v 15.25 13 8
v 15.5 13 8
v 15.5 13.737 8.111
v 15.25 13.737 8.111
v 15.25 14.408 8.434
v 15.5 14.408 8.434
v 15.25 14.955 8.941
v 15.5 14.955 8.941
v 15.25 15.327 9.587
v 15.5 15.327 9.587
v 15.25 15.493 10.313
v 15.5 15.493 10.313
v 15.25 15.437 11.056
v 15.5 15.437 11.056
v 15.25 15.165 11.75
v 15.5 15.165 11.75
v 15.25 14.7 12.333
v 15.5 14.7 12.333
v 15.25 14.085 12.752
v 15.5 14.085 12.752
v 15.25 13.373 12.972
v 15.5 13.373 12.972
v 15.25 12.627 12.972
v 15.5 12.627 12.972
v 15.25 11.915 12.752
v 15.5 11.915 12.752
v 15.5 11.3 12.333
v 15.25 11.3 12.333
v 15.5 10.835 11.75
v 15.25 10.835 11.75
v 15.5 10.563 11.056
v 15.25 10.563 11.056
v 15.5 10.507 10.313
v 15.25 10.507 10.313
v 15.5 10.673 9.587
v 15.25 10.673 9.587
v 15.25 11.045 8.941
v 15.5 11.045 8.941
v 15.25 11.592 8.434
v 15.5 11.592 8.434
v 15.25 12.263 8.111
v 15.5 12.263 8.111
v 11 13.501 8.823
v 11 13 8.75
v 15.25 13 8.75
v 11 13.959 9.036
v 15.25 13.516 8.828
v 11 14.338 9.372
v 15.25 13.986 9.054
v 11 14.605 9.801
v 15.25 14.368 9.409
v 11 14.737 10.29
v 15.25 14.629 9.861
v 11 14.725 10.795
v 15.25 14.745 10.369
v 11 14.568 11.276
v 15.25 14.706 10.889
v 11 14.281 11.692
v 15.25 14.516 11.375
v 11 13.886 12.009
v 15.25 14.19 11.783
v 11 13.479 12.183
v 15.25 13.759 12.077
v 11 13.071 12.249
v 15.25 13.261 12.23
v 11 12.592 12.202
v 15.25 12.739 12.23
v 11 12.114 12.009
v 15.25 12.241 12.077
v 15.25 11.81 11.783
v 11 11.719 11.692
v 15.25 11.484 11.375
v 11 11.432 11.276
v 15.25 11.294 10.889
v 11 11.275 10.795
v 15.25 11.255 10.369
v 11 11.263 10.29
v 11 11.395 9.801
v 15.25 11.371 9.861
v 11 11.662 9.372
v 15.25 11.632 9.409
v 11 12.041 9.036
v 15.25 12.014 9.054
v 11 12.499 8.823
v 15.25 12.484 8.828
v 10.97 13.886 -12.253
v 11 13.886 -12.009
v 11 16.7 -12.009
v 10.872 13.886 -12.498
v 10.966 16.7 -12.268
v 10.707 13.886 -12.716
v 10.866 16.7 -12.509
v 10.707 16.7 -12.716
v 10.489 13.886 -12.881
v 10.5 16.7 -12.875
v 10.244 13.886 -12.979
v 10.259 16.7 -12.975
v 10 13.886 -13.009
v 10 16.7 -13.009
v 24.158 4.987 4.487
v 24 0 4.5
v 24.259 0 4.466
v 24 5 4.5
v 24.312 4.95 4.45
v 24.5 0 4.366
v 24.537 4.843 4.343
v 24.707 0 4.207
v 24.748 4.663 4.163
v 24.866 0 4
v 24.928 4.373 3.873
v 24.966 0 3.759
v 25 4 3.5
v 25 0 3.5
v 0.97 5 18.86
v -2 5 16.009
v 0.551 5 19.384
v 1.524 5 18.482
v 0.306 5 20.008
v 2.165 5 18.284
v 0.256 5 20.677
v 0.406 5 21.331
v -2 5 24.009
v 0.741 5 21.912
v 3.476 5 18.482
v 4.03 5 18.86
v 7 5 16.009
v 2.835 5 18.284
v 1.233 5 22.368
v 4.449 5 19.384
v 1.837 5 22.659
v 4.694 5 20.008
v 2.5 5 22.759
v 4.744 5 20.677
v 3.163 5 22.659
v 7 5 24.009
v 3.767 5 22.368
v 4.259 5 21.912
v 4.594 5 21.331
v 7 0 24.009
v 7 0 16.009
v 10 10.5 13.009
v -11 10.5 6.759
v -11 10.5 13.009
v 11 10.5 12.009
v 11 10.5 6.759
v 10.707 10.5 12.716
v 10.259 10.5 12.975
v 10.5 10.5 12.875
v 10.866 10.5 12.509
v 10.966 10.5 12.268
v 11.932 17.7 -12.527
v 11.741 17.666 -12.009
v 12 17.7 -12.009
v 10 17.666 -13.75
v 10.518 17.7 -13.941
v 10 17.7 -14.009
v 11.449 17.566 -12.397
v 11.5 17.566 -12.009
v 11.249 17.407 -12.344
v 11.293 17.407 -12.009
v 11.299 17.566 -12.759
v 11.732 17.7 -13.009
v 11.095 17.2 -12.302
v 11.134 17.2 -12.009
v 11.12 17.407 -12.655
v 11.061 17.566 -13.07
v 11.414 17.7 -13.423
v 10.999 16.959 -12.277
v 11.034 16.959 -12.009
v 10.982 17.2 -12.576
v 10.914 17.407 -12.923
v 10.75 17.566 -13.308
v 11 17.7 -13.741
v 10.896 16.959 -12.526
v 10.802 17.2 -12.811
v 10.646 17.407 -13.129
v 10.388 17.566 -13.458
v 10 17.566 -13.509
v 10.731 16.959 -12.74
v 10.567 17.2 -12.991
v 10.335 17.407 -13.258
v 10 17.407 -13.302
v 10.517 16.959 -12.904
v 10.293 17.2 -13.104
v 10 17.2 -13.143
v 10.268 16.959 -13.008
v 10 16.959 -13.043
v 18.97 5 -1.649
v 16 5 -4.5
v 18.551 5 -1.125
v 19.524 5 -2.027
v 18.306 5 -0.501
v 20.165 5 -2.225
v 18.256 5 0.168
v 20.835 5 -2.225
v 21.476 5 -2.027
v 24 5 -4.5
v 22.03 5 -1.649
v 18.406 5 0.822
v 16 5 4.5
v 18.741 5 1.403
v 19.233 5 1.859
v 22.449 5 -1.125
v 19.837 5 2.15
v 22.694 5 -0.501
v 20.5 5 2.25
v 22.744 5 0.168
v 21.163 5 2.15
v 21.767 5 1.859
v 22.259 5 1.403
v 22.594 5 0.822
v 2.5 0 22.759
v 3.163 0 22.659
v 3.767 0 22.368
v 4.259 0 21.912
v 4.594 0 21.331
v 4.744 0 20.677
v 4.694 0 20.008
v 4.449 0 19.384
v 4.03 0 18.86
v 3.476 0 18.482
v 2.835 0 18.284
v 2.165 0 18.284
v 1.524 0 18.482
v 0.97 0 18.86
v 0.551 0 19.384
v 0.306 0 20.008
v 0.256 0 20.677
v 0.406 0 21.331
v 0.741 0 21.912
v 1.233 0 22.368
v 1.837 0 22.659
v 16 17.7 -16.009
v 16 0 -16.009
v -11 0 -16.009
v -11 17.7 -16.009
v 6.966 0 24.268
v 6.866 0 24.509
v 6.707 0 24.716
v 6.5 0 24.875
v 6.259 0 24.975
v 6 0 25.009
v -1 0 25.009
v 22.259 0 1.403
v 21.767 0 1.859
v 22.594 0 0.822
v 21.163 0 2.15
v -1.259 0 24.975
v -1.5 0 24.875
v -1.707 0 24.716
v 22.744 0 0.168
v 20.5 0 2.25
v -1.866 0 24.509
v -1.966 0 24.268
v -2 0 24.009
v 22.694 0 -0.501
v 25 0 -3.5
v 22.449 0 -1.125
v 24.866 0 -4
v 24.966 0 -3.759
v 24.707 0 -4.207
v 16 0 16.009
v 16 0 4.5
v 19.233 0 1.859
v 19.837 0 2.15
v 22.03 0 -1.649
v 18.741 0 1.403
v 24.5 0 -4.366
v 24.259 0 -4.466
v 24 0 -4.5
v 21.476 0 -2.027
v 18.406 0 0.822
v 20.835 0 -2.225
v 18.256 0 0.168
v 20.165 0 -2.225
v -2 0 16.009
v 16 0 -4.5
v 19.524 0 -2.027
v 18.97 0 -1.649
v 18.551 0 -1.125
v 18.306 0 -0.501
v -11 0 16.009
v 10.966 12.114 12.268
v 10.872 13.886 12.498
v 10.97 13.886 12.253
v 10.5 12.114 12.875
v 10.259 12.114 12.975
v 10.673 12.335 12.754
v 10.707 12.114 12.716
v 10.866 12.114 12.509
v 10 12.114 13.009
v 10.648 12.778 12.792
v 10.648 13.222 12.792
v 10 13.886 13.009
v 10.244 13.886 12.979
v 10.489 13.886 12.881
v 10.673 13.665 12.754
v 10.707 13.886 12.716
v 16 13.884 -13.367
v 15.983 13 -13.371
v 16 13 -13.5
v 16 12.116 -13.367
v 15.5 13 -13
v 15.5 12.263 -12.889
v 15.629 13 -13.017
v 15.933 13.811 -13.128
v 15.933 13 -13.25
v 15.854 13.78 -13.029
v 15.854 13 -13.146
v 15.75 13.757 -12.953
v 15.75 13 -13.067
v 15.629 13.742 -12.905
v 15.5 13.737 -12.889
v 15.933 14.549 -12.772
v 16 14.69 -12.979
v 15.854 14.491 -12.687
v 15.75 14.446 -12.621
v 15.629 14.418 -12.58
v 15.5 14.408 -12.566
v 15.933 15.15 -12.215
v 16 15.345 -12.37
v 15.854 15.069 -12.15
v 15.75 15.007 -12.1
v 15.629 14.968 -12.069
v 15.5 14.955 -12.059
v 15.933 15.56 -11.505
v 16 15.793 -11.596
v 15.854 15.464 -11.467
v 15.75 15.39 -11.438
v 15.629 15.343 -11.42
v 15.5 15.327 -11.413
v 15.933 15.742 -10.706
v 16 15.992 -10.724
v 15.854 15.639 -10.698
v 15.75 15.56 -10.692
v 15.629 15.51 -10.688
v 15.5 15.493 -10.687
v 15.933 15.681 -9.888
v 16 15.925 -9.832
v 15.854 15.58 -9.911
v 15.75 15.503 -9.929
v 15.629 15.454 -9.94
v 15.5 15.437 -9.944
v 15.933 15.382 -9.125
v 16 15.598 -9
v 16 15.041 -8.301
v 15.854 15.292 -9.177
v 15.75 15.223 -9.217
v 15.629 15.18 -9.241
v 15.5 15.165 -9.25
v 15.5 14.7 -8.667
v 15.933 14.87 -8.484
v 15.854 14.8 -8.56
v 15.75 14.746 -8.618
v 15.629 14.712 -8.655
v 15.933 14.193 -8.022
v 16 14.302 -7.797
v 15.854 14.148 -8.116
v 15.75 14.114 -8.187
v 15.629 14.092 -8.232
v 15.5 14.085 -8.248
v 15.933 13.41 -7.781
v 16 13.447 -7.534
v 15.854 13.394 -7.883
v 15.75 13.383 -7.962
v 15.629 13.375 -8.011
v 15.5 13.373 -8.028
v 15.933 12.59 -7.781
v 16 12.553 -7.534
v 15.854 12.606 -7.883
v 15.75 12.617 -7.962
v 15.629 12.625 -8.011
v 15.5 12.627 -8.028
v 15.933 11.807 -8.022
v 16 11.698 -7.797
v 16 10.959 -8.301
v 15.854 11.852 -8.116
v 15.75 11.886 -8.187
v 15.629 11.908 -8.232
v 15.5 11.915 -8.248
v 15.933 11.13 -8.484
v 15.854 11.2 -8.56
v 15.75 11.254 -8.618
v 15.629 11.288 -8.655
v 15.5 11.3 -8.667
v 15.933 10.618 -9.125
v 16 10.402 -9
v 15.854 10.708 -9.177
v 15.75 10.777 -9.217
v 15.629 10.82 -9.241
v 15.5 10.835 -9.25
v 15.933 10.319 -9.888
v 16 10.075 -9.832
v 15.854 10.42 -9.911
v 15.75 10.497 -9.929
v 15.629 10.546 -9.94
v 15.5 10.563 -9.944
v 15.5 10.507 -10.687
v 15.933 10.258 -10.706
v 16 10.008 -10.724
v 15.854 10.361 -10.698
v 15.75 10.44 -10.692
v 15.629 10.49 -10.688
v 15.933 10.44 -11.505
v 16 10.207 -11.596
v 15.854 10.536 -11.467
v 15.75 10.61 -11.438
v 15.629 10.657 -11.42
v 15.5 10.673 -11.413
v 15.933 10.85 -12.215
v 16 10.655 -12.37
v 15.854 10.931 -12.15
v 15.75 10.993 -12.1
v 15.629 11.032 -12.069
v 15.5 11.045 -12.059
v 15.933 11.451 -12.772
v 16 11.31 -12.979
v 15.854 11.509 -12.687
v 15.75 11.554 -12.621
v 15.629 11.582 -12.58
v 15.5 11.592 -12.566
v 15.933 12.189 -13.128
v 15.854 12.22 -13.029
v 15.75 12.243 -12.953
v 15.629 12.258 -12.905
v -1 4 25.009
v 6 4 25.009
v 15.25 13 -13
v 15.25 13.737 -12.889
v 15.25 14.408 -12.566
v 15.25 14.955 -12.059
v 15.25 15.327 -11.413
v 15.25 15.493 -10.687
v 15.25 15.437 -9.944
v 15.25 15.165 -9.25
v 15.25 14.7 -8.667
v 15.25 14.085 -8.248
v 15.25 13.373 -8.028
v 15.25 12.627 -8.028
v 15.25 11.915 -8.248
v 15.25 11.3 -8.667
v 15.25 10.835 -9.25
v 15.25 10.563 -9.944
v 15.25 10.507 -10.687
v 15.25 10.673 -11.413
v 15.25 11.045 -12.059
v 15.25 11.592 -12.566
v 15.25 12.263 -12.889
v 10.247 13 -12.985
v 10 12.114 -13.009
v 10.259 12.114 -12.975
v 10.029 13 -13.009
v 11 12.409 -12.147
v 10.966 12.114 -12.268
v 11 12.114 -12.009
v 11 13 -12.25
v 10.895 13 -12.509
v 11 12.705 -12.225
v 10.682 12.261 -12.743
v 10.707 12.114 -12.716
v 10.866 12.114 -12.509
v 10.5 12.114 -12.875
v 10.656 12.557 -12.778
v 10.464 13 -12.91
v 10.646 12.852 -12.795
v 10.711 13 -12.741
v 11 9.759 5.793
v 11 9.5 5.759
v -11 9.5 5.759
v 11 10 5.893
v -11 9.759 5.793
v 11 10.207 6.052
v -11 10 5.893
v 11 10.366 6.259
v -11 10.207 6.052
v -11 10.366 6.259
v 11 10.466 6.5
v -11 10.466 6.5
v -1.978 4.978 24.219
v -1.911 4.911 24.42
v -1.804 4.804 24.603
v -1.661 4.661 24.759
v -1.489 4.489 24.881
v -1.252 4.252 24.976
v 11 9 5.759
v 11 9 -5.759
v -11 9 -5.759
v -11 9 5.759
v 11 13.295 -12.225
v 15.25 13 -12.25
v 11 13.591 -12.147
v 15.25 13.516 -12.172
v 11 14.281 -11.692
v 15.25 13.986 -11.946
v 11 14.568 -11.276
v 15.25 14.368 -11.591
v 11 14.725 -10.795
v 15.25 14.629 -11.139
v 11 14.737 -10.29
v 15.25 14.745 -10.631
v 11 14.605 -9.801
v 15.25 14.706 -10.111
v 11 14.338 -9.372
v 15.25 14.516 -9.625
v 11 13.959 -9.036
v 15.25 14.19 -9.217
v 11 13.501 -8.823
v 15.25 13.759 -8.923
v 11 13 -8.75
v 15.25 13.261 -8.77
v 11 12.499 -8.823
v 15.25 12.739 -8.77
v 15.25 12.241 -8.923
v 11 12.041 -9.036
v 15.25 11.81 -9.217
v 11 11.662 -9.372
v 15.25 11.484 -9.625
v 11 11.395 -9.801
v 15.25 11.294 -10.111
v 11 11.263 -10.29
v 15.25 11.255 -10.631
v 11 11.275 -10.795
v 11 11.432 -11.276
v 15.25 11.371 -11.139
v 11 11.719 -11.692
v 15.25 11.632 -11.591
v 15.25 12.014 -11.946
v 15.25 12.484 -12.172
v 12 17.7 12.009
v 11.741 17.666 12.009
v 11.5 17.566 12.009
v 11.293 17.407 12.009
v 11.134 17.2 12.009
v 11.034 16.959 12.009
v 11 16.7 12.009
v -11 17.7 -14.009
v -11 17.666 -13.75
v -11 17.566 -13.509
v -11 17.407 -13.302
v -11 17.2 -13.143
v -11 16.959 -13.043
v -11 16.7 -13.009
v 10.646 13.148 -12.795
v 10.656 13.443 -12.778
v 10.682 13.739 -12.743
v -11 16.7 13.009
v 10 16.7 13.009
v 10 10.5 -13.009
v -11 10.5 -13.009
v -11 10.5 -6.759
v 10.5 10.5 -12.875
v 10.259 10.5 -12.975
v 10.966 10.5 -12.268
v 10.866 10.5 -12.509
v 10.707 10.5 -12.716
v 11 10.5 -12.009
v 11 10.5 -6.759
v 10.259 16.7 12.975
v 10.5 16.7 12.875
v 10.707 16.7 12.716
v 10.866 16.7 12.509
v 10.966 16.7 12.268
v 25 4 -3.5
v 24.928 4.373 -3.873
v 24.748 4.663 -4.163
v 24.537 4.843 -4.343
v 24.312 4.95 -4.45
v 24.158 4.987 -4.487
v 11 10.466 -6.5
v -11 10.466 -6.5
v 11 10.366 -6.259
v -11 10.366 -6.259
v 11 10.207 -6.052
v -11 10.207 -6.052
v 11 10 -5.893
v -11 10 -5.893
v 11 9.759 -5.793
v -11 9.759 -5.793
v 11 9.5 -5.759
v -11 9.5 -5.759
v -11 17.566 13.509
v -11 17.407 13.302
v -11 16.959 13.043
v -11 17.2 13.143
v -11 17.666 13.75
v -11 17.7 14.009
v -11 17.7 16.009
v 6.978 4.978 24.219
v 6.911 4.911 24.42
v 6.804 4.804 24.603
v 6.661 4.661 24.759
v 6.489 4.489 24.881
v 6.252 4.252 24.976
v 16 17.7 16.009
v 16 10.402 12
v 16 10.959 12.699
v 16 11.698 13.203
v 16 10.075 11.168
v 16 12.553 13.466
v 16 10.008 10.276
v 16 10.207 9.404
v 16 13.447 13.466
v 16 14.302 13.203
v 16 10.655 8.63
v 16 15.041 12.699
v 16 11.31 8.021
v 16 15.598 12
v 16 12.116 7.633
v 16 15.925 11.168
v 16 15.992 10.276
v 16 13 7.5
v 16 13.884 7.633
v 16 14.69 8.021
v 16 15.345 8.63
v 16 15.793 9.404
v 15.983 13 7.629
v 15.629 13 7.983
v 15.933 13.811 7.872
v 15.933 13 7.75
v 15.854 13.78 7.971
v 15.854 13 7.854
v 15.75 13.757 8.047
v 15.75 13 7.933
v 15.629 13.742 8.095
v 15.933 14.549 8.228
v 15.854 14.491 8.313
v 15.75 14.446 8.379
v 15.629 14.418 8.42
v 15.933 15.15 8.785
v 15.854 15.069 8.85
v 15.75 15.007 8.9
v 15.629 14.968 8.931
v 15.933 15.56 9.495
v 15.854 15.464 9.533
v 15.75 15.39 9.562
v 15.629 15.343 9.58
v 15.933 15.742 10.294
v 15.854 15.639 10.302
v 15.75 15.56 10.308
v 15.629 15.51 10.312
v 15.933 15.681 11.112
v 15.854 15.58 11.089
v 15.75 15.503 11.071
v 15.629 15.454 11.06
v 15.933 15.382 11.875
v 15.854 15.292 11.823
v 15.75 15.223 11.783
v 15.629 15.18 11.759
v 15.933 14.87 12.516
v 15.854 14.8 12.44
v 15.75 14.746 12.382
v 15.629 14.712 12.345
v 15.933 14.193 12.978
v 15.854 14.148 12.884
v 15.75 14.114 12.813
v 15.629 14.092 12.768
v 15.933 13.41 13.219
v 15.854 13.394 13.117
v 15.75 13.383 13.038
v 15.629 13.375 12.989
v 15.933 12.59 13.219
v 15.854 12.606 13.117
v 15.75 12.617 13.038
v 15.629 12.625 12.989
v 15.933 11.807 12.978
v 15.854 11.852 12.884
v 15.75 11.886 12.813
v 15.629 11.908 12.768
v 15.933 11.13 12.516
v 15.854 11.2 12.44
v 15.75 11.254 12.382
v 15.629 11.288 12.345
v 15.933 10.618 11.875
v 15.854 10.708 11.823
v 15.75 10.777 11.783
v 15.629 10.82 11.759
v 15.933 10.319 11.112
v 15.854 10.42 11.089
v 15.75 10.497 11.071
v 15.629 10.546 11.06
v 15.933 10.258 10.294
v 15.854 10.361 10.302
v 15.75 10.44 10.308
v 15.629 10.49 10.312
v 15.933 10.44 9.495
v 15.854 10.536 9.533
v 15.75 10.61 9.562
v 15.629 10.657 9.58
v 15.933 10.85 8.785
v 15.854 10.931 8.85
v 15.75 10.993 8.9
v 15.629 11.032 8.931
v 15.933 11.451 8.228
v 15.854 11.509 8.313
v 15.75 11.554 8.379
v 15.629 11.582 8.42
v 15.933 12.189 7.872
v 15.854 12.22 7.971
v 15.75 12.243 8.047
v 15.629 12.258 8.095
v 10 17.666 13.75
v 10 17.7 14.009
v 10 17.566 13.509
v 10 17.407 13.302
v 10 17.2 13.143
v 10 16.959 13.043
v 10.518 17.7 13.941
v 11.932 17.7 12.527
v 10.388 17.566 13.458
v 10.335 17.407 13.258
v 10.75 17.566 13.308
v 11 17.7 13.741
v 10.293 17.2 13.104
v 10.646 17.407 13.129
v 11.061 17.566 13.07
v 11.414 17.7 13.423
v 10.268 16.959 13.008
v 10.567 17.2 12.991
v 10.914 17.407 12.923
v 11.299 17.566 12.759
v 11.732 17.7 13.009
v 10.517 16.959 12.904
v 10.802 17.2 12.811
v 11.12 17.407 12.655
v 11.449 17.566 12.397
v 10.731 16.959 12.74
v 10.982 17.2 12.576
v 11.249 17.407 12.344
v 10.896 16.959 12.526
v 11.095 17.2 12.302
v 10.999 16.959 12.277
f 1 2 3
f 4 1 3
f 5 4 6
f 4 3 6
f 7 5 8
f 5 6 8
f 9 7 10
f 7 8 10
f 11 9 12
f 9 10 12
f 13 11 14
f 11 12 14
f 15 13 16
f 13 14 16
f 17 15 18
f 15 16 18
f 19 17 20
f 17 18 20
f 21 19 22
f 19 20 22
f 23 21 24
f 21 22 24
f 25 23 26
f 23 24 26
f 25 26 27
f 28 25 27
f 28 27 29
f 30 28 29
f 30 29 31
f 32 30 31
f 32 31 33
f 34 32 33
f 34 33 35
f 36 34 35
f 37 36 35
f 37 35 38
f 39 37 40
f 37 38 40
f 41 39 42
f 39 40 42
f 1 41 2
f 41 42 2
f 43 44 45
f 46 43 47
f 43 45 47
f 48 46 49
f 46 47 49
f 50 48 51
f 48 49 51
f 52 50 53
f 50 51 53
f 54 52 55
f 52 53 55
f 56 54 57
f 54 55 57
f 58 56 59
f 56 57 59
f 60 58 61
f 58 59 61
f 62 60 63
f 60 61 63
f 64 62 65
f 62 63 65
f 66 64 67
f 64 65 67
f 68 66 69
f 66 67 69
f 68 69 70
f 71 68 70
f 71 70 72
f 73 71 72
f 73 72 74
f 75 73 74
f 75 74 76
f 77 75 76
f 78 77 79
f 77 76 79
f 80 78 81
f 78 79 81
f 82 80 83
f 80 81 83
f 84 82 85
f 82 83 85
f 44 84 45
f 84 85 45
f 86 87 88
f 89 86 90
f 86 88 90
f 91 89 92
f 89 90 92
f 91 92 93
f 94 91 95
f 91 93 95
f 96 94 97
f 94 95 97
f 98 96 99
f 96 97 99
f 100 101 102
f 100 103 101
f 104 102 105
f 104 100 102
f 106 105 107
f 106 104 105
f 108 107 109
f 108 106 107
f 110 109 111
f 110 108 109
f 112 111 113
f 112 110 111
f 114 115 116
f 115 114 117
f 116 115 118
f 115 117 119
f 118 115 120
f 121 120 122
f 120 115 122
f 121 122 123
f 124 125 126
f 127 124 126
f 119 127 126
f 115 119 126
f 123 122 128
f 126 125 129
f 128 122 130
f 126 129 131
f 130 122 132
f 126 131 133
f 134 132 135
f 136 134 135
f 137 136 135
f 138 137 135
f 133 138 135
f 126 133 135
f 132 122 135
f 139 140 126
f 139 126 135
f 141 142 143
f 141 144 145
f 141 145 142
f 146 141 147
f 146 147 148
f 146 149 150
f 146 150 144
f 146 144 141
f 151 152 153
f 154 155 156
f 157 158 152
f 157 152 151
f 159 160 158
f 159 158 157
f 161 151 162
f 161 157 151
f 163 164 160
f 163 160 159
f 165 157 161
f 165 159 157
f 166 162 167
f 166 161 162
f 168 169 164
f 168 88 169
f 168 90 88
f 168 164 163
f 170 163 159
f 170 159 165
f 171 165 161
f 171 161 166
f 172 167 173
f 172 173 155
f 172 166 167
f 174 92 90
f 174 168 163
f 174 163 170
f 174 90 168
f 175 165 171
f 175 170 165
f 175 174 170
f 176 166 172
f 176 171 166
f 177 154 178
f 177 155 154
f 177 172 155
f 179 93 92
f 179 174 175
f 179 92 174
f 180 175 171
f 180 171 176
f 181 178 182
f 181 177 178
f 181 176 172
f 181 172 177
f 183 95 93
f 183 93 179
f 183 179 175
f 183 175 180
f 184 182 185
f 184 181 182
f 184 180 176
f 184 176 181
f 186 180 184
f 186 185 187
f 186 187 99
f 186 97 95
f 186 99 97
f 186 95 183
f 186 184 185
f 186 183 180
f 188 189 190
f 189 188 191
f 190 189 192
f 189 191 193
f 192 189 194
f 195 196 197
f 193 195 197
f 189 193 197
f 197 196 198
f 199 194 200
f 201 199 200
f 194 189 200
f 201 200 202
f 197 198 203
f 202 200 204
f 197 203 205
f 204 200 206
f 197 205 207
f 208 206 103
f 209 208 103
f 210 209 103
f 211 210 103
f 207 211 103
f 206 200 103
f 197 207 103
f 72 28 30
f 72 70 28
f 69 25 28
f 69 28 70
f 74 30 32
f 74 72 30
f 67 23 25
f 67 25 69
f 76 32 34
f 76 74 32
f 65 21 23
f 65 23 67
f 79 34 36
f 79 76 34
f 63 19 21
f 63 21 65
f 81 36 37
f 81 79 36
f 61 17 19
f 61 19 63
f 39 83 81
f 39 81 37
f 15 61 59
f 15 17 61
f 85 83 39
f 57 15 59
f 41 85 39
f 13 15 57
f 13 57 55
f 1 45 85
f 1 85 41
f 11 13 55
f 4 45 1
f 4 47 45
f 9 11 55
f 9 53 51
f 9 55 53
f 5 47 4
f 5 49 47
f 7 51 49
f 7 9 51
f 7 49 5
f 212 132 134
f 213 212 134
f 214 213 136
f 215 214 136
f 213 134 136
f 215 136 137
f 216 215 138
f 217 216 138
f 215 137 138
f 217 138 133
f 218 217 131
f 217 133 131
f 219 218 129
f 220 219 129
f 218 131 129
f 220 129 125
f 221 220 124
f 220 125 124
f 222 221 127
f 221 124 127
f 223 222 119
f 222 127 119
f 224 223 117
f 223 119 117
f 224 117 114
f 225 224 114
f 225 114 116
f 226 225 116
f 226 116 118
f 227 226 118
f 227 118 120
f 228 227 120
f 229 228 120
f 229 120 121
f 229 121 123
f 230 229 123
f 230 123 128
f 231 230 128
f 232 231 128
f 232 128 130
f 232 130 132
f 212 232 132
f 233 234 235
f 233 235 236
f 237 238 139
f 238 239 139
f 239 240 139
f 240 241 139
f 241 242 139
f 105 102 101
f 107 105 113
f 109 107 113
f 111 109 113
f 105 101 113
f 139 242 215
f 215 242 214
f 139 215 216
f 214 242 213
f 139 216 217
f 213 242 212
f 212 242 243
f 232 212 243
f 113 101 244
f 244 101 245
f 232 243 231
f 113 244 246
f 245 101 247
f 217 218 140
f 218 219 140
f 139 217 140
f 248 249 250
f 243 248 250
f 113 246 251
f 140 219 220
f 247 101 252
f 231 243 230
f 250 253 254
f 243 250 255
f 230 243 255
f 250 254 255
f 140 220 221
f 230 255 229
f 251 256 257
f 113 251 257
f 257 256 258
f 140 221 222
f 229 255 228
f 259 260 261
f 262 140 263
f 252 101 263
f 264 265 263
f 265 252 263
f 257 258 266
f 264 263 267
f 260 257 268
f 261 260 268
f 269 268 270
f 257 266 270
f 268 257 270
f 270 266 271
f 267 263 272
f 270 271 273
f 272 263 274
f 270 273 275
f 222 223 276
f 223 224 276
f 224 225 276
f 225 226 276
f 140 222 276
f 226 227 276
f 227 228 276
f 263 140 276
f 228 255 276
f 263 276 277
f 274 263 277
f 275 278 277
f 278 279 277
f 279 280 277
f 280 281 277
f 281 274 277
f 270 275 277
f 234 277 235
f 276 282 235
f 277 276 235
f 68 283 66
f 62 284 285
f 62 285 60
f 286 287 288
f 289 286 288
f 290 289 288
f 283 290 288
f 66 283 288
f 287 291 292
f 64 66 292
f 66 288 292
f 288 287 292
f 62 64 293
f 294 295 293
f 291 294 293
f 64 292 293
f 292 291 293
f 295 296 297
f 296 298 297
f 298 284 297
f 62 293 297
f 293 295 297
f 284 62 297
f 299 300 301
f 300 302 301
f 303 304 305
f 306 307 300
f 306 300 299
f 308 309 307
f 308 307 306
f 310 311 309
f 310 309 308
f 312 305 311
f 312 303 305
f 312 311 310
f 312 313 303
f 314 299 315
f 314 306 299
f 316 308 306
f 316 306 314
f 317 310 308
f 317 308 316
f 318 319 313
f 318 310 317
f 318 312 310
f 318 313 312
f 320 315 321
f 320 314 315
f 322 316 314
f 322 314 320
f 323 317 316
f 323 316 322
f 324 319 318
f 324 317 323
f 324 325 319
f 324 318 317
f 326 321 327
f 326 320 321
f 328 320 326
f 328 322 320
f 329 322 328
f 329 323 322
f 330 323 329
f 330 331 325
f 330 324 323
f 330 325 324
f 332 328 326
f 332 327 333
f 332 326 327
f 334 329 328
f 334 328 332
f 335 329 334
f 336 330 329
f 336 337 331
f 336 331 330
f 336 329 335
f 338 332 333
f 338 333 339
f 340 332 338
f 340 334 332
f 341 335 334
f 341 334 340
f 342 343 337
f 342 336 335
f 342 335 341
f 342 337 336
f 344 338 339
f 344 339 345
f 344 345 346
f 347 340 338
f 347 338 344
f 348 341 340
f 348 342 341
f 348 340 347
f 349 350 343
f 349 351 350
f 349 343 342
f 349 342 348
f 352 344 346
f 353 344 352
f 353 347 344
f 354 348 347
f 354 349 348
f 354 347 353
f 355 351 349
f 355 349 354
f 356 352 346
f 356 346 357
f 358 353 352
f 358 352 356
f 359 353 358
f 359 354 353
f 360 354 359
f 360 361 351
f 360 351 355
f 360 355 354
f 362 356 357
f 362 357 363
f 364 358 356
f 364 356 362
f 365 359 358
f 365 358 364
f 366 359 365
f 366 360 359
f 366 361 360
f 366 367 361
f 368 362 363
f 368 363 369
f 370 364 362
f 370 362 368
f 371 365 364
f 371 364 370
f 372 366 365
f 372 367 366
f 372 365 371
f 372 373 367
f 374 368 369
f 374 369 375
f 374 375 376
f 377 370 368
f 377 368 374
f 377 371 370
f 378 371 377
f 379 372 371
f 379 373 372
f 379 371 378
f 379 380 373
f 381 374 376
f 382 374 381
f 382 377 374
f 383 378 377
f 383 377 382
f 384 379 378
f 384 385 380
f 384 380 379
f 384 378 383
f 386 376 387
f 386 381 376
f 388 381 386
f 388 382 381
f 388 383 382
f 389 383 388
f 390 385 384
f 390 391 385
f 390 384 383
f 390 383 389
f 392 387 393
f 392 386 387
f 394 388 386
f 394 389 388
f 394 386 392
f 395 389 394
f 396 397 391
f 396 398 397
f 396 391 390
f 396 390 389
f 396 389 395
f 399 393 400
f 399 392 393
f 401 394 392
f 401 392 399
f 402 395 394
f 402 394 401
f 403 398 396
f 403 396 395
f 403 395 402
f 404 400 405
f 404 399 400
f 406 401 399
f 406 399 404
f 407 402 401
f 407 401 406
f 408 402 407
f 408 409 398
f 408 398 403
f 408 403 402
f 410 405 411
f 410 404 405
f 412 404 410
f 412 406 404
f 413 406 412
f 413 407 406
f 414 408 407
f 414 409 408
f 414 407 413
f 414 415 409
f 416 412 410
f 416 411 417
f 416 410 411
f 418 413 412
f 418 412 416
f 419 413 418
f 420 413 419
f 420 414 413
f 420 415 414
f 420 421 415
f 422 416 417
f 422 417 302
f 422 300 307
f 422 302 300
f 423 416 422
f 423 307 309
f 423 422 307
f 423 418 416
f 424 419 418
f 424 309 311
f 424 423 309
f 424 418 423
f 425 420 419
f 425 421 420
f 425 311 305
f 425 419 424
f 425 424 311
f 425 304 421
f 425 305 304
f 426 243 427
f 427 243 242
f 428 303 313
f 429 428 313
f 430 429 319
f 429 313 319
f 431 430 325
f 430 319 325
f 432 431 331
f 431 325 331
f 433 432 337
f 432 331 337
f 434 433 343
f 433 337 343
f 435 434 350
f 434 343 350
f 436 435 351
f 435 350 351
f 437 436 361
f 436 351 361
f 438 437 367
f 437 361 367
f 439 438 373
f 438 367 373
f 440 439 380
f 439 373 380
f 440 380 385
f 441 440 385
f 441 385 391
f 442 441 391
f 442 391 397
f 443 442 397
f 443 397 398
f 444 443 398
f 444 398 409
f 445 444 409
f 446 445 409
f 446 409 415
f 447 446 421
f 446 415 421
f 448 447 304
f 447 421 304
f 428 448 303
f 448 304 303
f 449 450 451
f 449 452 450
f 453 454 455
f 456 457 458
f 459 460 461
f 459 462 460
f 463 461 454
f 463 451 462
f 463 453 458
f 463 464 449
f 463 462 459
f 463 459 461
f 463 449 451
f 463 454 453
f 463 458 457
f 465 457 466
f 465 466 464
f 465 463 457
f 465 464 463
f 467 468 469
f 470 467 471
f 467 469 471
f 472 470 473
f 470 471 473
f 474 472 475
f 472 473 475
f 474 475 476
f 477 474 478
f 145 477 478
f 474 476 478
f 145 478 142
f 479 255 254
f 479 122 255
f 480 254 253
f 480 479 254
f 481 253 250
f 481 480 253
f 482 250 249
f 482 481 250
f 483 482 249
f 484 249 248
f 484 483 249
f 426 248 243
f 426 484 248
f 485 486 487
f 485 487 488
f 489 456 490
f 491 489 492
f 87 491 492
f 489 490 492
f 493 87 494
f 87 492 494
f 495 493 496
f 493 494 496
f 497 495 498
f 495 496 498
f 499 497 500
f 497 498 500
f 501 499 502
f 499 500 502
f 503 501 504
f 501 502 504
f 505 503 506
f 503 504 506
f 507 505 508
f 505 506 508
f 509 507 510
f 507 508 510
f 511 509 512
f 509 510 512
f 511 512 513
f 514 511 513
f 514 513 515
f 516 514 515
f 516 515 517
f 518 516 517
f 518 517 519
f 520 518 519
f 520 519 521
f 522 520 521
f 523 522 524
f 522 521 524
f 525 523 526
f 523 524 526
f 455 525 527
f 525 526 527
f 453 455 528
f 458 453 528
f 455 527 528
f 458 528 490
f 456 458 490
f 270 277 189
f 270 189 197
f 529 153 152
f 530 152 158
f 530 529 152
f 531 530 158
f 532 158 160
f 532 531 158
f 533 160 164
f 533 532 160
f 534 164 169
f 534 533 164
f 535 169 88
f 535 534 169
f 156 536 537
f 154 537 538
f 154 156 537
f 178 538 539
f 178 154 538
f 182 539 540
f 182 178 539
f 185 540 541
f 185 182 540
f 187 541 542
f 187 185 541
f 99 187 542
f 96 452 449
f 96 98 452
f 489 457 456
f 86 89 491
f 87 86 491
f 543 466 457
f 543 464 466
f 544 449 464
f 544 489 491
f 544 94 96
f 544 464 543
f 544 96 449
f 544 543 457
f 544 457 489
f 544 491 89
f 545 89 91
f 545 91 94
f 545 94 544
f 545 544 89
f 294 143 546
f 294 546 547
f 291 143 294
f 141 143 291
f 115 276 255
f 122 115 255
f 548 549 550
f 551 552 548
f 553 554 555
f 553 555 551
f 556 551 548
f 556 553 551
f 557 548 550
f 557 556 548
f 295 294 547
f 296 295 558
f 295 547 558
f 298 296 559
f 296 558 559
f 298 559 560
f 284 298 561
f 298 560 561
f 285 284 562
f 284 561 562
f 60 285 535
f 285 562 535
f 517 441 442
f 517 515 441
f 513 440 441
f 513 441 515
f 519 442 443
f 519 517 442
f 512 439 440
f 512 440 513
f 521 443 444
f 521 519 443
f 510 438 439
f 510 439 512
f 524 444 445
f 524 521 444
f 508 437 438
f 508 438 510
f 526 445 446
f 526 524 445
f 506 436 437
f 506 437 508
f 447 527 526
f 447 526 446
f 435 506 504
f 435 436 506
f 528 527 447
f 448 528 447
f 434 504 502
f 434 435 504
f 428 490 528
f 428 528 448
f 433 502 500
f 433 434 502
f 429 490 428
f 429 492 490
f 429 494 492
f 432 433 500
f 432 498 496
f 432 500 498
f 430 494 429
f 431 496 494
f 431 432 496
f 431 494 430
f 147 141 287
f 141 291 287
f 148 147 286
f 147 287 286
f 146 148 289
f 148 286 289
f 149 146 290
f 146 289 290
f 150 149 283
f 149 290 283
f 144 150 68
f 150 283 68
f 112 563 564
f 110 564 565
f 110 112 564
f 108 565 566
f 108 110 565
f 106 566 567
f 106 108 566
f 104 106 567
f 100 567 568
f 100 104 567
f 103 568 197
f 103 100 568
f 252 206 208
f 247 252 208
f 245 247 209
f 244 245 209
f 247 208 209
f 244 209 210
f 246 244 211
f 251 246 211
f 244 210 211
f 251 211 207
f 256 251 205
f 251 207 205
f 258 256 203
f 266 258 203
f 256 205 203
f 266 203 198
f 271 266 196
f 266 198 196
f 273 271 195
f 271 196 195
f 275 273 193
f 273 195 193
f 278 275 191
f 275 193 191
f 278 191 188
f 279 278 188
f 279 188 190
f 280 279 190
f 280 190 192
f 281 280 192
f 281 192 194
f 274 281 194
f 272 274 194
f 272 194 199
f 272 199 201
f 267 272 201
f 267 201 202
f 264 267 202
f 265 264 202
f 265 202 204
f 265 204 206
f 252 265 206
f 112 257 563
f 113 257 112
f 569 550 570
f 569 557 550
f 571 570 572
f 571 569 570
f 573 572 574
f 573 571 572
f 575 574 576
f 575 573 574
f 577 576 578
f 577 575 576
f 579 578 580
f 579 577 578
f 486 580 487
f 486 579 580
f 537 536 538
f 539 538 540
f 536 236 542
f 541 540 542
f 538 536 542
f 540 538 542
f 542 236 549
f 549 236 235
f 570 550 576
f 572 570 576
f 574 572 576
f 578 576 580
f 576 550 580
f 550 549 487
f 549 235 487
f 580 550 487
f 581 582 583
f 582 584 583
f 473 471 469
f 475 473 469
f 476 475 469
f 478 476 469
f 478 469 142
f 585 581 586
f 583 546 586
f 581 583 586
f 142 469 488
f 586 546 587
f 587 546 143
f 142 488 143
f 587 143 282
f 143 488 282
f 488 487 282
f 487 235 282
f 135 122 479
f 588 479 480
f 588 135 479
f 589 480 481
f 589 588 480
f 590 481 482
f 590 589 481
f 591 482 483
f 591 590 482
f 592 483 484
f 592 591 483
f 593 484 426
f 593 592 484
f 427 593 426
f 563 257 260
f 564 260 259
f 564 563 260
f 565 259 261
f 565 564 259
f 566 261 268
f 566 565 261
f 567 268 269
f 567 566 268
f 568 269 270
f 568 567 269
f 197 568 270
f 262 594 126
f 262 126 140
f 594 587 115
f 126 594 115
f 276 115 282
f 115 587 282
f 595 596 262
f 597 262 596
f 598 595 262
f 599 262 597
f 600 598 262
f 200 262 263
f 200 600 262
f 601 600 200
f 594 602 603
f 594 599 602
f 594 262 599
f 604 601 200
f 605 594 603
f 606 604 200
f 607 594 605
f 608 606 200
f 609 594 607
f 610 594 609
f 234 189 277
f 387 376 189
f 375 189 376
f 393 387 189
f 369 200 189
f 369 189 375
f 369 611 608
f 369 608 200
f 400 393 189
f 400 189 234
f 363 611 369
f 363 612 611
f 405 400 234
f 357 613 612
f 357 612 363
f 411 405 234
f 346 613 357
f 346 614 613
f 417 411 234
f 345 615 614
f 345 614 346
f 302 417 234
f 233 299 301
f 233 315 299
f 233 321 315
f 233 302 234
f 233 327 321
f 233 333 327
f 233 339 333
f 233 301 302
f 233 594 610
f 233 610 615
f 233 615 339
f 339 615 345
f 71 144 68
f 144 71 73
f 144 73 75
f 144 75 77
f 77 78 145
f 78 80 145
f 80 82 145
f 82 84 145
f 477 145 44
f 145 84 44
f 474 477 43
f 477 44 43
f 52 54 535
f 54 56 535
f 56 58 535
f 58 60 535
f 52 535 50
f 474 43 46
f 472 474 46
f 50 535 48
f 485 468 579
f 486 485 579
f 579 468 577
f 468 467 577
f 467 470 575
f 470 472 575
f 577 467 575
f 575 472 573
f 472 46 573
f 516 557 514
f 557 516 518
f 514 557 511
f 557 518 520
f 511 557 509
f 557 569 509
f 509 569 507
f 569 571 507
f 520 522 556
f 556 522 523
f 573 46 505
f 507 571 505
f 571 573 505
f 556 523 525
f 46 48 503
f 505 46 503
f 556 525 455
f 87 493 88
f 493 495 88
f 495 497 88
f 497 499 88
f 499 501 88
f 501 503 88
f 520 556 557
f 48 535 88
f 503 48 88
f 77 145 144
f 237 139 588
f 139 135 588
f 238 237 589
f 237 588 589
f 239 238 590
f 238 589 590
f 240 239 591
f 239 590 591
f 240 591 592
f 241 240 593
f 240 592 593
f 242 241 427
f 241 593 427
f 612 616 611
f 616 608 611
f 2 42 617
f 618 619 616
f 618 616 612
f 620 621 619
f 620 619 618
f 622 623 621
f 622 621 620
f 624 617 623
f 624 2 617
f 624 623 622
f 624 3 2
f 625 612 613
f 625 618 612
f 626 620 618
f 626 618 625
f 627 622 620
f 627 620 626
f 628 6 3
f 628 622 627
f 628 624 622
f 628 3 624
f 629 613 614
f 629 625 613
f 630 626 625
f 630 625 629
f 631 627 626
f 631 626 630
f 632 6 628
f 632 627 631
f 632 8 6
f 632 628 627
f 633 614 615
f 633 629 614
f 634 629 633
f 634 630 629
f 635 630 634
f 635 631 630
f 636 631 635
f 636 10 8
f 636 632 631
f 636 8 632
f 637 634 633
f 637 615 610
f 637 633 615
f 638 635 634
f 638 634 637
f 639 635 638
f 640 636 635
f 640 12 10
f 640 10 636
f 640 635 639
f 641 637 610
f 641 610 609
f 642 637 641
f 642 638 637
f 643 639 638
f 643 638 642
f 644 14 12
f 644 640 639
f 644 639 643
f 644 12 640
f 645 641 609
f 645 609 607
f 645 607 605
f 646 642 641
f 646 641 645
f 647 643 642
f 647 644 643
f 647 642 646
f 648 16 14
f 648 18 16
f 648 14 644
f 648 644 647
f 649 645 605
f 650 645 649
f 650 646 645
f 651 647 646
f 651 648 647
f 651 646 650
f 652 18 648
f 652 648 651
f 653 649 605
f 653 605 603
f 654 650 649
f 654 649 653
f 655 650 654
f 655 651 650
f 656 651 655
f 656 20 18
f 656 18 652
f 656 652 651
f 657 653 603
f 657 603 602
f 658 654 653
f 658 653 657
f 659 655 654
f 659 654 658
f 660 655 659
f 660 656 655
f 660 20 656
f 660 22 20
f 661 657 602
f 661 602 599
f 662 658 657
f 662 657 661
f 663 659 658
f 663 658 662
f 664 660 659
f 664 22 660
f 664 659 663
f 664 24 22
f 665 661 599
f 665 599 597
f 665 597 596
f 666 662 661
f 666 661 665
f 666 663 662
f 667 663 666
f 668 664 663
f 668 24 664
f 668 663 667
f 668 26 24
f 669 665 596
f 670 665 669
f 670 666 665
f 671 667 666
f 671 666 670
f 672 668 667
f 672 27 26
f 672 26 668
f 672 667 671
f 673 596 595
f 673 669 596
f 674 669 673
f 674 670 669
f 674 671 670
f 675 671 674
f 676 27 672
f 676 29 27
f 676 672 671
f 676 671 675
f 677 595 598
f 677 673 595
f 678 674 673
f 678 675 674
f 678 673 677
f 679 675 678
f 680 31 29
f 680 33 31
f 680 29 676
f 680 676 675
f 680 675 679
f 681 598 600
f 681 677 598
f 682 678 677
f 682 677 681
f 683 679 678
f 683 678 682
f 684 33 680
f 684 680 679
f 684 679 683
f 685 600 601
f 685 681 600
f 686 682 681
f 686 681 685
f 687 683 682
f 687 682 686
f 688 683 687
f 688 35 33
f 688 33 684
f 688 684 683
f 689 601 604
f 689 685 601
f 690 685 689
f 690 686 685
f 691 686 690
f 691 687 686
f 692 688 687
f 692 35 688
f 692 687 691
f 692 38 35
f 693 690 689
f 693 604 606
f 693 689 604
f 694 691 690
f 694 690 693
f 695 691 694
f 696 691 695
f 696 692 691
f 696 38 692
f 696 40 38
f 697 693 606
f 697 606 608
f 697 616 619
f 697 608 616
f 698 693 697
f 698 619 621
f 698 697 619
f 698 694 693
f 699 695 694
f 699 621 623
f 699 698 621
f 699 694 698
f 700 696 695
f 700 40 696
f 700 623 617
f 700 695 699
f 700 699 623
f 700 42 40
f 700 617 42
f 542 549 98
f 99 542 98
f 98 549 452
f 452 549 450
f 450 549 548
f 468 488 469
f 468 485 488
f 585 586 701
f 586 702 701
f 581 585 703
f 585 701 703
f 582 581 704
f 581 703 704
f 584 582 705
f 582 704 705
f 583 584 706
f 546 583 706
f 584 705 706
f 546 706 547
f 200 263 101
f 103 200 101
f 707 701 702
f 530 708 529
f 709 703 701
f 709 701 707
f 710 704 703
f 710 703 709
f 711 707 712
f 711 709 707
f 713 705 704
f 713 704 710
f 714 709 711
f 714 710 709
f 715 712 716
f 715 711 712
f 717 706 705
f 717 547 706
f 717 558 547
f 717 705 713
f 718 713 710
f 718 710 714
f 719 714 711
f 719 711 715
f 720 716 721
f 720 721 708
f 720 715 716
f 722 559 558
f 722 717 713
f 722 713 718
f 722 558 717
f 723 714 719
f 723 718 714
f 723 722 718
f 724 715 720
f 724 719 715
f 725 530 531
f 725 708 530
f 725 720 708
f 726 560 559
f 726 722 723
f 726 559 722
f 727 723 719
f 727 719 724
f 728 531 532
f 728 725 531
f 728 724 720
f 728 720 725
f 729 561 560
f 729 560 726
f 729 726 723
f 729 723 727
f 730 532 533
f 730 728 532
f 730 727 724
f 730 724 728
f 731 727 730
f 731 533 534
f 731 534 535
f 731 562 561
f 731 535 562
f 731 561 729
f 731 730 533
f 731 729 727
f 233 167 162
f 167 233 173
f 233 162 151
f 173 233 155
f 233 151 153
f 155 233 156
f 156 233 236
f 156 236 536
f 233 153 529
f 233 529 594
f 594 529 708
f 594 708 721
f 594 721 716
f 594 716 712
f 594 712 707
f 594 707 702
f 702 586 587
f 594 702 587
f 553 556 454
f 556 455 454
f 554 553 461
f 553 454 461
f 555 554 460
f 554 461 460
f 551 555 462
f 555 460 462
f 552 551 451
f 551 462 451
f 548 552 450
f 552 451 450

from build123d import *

# Parameters (mm, degrees)
BOSS_EXTRUDE1_DEPTH = 11
SKETCH3_W           = 22
SKETCH3_H           = 3
BOSS_EXTRUDE2_DEPTH = 17.7
BOSS_EXTRUDE3_DEPTH = 5
SKETCH5_R           = 1.75
CUT_EXTRUDE1_DEPTH  = 37.035744466
SKETCH6_W           = 9
SKETCH6_H           = 9
BOSS_EXTRUDE4_DEPTH = 5
SKETCH7_R           = 2.25
CUT_EXTRUDE2_DEPTH  = 38.573063213
FILLET1_R           = 1
SKETCH8_R           = 2.5
CUT_EXTRUDE3_DEPTH  = 0.75
FILLET2_R           = 0.5


with BuildPart() as part:
    # Sketch1 → Boss-Extrude1 (new, symmetric)
    with BuildSketch(Plane(origin=(0, 0, 0), x_dir=(0, 0, -1), z_dir=(1, 0, 0))):
        Polygon((-13.0089, 0), (13.0089, 0), (13.0089, 10.5), (5.7589, 10.5), (5.7589, 9), (-5.7589, 9), (-5.7589, 10.5), (-13.0089, 10.5), align=None)
    extrude(amount=BOSS_EXTRUDE1_DEPTH, both=True)

    # Sketch3 → Boss-Extrude2 (add)
    with BuildSketch(Plane.XZ):
        with Locations((0, -14.5089)):
            Rectangle(SKETCH3_W, SKETCH3_H)
        with Locations((0, 14.5089)):
            Rectangle(SKETCH3_W, SKETCH3_H)
    extrude(amount=-BOSS_EXTRUDE2_DEPTH)

    # Sketch4 → Boss-Extrude3 (add)
    with BuildSketch(Plane(origin=(11, 0, 0), x_dir=(0, 0, -1), z_dir=(1, 0, 0))):
        Polygon((-8.8, 17.7), (-16.0089, 17.7), (-16.0089, 0), (16.0089, 0), (16.0089, 17.7), align=None)
    extrude(amount=BOSS_EXTRUDE3_DEPTH)

    # Sketch5 → Cut-Extrude1 (cut, through all)
    with BuildSketch(Plane(origin=(16, 0, 0), x_dir=(0, 0, -1), z_dir=(1, 0, 0))):
        with Locations((-10.5, 13)):
            Circle(SKETCH5_R)
        with Locations((10.5, 13)):
            Circle(SKETCH5_R)
    extrude(amount=-CUT_EXTRUDE1_DEPTH, mode=Mode.SUBTRACT)

    # Sketch6 → Boss-Extrude4 (add)
    with BuildSketch(Plane.XZ):
        with Locations((20.5, 0)):
            Rectangle(SKETCH6_W, SKETCH6_H)
        with Locations((2.5, 20.5089)):
            Rectangle(SKETCH6_W, SKETCH6_H)
    extrude(amount=-BOSS_EXTRUDE4_DEPTH)

    # Sketch7 → Cut-Extrude2 (cut, through all)
    with BuildSketch(Plane(origin=(0, 5, 0), x_dir=(1, 0, 0), z_dir=(0, 1, 0))):
        with Locations(Location((20.5, 0, 0), (0, 0, 270))):
            Circle(SKETCH7_R)
        with Locations(Location((2.5, -20.5089, 0), (0, 0, 270))):
            Circle(SKETCH7_R)
    extrude(amount=-CUT_EXTRUDE2_DEPTH, mode=Mode.SUBTRACT)

    # Fillet1
    fillet1_edges = [part.edges().sort_by_distance(p)[0] for p in [
        (0, 10.5, 5.7589),
        (0, 10.5, -5.7589),
        (0, 17.7, -13.0089),
        (11, 14.1, -13.0089),
        (11, 14.1, 13.0089),
        (0, 17.7, 13.0089),
        (11, 17.7, 0),
        (25, 5, 0),
        (25, 2.5, 4.5),
        (25, 2.5, -4.5),
        (7, 2.5, 25.0089),
        (2.5, 5, 25.0089),
        (-2, 2.5, 25.0089),
    ]]
    fillet(fillet1_edges, radius=FILLET1_R)

    # Sketch8 → Cut-Extrude3 (cut)
    with BuildSketch(Plane(origin=(16, 0, 0), x_dir=(0, 0, -1), z_dir=(1, 0, 0))):
        with Locations((-10.5, 13)):
            Circle(SKETCH8_R)
        with Locations((10.5, 13)):
            Circle(SKETCH8_R)
    extrude(amount=-CUT_EXTRUDE3_DEPTH, mode=Mode.SUBTRACT)

    # Fillet2
    fillet2_edges = [part.edges().sort_by_distance(p)[0] for p in [
        (16, 13, 13),
        (16, 13, -8),
    ]]
    fillet(fillet2_edges, radius=FILLET2_R)


solid = part.part
